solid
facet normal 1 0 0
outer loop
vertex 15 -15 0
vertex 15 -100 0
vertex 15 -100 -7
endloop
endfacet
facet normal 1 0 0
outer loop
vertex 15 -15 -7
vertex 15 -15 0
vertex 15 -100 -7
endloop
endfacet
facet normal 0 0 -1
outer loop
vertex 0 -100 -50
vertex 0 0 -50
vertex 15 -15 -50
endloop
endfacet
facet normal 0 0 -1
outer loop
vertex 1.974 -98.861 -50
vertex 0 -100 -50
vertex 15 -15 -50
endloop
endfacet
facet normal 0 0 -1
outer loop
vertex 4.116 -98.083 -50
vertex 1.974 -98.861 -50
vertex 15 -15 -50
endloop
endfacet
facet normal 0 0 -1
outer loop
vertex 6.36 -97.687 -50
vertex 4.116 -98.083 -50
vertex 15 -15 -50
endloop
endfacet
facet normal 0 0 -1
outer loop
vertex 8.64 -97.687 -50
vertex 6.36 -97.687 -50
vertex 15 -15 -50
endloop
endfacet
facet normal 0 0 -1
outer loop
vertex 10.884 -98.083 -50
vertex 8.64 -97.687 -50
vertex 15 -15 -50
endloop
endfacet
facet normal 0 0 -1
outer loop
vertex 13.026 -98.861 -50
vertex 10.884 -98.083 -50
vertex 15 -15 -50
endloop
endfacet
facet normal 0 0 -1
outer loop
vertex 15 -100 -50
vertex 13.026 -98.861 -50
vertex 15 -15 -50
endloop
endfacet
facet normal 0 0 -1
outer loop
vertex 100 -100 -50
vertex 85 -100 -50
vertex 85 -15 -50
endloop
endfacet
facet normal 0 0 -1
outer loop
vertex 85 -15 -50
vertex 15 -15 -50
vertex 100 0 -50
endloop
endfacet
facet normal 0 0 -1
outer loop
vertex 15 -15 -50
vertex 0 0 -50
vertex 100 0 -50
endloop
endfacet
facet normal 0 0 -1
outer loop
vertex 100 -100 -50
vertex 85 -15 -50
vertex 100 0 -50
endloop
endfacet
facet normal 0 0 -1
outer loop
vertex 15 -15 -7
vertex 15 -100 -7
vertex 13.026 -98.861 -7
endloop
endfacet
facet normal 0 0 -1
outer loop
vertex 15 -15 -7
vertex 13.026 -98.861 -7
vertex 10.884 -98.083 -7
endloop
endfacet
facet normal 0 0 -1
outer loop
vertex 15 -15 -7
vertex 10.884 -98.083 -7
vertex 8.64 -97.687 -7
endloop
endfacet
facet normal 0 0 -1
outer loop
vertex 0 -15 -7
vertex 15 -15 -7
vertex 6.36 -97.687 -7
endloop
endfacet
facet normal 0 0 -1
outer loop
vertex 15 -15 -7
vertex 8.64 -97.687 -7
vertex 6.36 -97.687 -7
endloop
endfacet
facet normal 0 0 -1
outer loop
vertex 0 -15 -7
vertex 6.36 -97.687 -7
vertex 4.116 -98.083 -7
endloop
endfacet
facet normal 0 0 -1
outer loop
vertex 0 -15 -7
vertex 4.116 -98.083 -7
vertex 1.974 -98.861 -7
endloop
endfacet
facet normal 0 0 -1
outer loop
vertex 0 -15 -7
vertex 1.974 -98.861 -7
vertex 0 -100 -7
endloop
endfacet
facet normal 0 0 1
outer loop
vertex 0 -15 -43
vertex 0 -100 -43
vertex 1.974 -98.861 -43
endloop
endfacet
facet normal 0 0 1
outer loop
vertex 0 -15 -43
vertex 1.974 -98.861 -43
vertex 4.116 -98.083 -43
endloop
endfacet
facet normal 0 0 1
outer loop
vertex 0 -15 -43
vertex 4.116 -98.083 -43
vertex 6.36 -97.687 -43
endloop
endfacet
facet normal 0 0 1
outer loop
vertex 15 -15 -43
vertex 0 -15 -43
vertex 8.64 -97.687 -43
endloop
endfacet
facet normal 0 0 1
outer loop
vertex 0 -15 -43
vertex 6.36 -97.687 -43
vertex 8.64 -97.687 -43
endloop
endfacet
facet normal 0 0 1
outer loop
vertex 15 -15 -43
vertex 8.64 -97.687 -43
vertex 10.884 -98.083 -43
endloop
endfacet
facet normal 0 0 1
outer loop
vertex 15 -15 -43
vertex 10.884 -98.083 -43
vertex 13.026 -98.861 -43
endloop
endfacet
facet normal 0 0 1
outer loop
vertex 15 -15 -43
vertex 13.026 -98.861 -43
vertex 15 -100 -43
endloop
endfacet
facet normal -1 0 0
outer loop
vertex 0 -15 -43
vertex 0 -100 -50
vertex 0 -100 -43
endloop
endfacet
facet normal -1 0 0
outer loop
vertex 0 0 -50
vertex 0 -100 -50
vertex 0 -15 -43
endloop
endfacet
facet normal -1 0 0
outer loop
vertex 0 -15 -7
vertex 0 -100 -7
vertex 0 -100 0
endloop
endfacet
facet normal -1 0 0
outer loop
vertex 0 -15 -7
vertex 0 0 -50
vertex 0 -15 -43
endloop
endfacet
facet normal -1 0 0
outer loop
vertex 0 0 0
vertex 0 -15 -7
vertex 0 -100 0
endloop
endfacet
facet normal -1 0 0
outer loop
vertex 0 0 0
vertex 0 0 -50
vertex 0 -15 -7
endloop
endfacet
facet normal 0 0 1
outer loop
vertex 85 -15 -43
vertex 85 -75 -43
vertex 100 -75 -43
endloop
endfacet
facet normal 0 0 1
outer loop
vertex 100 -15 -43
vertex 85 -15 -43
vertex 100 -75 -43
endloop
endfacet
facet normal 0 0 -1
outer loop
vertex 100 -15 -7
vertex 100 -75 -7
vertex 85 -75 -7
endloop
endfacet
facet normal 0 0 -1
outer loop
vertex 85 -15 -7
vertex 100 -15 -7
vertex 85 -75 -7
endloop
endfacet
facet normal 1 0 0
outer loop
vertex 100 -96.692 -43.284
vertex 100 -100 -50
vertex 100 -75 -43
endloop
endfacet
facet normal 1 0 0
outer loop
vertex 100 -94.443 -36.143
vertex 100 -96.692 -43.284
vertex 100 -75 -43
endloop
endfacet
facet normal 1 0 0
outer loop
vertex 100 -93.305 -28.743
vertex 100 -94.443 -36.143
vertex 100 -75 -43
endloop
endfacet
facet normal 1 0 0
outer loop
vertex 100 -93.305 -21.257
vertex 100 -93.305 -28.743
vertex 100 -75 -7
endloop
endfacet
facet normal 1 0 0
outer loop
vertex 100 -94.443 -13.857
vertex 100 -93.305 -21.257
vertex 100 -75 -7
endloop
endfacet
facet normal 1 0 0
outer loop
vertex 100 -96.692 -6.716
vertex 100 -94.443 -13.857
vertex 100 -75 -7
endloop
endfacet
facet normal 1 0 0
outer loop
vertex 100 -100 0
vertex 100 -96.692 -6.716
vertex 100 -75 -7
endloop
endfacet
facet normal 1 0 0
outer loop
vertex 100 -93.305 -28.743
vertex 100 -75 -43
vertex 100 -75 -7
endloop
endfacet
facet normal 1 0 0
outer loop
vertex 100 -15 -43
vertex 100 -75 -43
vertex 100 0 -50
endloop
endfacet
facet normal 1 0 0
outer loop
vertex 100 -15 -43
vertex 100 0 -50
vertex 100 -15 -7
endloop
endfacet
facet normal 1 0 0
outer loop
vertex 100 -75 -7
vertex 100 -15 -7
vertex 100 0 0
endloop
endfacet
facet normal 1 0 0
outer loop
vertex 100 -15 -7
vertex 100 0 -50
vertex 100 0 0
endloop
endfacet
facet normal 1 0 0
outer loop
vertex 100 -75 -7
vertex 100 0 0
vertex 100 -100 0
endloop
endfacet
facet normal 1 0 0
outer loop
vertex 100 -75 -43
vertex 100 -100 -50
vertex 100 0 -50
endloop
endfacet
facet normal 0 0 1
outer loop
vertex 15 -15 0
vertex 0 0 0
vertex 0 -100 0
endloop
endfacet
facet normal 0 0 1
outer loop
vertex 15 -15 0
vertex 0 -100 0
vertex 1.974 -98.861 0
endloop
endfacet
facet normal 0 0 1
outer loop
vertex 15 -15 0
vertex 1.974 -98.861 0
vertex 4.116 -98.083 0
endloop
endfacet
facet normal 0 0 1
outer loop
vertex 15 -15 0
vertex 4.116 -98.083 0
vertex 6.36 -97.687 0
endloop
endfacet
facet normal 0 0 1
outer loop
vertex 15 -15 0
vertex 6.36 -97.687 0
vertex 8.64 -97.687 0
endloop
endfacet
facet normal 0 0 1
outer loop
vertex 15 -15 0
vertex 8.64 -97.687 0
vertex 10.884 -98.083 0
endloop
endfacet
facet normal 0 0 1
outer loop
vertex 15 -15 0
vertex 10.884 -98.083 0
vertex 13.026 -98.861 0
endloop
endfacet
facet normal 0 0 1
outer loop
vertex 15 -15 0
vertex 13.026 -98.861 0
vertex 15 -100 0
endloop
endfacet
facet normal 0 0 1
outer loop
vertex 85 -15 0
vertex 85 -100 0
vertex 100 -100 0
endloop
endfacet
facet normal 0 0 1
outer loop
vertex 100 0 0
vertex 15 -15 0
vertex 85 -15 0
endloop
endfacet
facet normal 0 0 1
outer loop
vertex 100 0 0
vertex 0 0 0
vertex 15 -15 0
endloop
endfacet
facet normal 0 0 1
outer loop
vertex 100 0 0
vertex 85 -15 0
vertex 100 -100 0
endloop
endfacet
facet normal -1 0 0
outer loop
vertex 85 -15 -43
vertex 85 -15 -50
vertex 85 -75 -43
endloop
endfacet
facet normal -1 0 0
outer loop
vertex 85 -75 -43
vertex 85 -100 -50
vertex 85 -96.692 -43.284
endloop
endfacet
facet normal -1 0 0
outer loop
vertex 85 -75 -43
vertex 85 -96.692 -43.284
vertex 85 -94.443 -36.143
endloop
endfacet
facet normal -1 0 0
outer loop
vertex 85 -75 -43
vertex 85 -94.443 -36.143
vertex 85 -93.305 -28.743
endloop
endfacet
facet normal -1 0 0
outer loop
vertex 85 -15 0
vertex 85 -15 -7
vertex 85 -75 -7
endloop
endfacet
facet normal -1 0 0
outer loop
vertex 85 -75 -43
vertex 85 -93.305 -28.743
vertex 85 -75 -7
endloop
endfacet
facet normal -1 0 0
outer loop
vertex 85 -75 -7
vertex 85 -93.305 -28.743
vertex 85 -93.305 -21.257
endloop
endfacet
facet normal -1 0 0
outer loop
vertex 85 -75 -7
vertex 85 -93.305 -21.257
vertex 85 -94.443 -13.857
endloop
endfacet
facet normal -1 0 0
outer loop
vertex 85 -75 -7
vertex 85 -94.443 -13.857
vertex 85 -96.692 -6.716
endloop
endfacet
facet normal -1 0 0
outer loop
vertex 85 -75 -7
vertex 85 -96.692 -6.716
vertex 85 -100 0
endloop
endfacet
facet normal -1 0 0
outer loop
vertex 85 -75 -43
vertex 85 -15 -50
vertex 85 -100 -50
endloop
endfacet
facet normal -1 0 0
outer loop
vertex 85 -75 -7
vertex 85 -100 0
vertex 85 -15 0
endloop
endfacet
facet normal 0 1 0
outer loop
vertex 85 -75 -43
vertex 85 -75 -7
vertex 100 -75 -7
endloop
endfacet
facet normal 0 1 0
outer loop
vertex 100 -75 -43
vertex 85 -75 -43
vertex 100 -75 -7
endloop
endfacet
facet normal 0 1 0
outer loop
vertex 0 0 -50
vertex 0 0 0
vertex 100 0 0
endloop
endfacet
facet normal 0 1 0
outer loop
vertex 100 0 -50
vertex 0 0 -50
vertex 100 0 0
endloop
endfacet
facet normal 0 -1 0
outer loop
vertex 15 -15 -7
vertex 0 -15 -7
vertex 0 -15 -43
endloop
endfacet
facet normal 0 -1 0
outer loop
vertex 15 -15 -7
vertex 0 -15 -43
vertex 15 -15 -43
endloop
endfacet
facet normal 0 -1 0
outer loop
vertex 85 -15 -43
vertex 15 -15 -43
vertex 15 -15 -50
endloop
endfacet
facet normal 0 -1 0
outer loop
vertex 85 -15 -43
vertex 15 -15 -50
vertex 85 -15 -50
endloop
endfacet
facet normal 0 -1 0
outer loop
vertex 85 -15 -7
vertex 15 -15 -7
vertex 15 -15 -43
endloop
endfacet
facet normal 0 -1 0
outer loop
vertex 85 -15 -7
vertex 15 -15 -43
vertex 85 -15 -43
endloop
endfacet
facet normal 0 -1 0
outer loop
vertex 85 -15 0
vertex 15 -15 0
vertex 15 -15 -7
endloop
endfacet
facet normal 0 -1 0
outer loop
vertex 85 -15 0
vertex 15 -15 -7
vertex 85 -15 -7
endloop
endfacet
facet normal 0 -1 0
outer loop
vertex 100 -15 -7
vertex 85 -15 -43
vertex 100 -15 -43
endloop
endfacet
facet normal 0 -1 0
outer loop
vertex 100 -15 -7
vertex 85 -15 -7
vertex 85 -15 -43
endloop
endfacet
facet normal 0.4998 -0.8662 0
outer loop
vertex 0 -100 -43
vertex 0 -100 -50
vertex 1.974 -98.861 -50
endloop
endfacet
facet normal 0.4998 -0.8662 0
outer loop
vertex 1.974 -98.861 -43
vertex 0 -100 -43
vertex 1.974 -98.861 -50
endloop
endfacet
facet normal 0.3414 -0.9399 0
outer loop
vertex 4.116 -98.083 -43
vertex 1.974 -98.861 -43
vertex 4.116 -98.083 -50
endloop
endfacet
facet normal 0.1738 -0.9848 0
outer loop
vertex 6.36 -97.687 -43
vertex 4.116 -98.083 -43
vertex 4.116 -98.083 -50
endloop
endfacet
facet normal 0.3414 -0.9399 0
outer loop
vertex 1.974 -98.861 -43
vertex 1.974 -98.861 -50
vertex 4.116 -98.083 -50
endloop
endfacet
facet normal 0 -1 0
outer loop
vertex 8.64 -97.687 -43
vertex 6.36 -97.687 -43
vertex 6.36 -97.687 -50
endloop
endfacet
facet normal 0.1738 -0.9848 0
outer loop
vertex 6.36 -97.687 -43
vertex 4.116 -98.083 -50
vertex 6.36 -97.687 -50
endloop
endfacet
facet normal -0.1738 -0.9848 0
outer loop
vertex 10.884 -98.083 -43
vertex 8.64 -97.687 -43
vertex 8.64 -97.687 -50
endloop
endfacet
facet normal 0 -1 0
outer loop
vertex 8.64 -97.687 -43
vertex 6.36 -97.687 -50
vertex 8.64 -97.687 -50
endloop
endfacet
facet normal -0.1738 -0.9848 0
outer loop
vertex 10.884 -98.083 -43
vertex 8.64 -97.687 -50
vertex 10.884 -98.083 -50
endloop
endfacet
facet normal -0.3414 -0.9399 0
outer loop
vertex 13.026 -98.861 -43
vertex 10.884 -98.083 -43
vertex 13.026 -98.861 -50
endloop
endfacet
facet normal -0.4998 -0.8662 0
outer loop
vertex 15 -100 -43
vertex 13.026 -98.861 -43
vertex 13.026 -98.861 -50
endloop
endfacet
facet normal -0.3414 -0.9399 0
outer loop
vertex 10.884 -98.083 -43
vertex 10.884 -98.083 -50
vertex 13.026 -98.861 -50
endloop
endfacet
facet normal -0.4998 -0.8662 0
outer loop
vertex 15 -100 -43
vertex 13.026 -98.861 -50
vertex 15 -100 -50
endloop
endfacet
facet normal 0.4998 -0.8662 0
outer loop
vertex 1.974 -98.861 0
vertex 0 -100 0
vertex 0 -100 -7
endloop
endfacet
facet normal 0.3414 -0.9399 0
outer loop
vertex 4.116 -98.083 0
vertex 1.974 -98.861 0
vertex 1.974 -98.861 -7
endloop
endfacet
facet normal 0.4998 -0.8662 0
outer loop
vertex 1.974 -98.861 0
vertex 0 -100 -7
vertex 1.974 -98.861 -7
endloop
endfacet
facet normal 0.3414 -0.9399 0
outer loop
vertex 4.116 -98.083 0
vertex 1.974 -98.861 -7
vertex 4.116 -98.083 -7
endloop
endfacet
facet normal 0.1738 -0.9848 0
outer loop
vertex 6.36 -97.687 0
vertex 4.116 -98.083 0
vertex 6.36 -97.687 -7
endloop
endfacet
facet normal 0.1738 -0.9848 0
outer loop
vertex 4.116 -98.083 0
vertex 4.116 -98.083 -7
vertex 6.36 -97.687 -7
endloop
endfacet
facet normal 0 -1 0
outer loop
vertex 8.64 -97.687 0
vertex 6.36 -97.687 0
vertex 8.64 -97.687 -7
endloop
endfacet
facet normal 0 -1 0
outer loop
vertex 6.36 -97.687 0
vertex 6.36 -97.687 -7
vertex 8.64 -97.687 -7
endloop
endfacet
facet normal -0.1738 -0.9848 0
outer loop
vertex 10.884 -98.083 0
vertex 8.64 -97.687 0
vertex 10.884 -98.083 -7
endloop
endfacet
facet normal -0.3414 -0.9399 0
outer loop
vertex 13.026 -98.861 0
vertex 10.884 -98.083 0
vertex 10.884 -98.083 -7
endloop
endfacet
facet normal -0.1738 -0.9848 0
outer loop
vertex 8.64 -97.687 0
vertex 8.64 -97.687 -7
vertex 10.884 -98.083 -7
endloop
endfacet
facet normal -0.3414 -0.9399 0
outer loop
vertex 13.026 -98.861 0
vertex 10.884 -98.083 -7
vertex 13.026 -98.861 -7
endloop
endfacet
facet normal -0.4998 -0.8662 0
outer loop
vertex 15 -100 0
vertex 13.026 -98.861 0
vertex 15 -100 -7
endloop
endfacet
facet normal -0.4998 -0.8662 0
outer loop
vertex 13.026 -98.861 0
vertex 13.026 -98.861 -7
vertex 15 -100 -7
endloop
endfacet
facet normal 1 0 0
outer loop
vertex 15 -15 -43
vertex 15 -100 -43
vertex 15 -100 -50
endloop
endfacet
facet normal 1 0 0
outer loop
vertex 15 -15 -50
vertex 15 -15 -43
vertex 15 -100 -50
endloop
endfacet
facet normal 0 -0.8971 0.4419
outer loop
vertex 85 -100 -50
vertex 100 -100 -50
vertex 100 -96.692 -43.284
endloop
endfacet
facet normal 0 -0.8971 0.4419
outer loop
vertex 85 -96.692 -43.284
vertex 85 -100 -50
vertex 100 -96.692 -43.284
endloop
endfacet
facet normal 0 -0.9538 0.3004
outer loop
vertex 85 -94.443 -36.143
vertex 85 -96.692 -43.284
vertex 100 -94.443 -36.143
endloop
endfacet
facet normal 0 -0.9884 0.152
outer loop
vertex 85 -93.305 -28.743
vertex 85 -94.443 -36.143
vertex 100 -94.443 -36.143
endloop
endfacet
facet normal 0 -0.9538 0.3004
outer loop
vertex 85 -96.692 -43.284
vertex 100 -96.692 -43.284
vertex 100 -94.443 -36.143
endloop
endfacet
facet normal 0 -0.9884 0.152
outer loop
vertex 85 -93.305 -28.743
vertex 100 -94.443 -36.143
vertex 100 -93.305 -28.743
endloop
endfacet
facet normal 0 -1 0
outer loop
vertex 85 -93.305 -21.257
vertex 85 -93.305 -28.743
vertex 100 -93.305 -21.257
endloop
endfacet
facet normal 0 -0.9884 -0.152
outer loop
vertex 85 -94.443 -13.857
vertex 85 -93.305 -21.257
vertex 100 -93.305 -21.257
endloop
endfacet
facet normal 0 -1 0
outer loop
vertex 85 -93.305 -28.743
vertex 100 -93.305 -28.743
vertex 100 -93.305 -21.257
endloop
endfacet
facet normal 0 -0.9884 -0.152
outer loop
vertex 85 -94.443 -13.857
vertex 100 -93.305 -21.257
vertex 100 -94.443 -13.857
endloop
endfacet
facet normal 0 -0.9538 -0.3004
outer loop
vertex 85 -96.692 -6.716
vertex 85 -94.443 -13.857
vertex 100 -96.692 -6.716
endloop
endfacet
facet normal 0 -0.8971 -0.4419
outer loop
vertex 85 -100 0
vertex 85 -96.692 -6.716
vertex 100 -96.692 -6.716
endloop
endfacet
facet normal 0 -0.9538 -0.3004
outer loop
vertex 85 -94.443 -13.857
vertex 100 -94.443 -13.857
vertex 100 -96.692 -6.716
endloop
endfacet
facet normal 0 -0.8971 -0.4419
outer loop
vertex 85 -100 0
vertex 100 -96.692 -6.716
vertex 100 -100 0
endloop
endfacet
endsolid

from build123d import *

# Parameters (mm, degrees)
F0_W     = 100
F0_H     = 50
F1_DEPTH = 100
F3_DEPTH = 85
F4_W     = 15
F4_H     = 50
F5_DEPTH = 25
F7_DEPTH = 15
F9_DEPTH = 50


with BuildPart() as f1:
    # F0 (on Front) → F1 (new body)
    with BuildSketch(Plane.XZ):
        with Locations((50, -25)):
            Rectangle(F0_W, F0_H)
    extrude(amount=F1_DEPTH)

    # F2 (on face) → F3 (cut)
    with BuildSketch(Plane.XZ.offset(100)):
        Polygon((85, 0), (15, 0), (15, -7), (0, -7), (0, -43), (15, -43), (15, -50), (85, -50), (85, -43), (100, -43), (100, -7), (85, -7), align=None)
    extrude(amount=-F3_DEPTH, mode=Mode.SUBTRACT)

    # F4 (on face) → F5 (join)
    with BuildSketch(Plane.XZ.offset(100)):
        with Locations((92.5, -25)):
            Rectangle(F4_W, F4_H)
    extrude(amount=-F5_DEPTH)

    # F6 (on face) → F7 (cut)
    with BuildSketch(Plane.YZ.offset(100)):
        with BuildLine():
            Line((-100, 0), (-100, -50))
            ThreePointArc((-100, -50), (-93.161987, -25), (-100, 0))
        make_face()
    extrude(amount=-F7_DEPTH, mode=Mode.SUBTRACT)

    # F8 (on face) → F9 (cut)
    with BuildSketch(Plane(origin=(0, 0, -50), x_dir=(1, 0, 0), z_dir=(0, 0, -1))):
        with BuildLine():
            Line((15, 100), (0, 100))
            ThreePointArc((0, 100), (7.5, 97.637464), (15, 100))
        make_face()
    extrude(amount=-F9_DEPTH, mode=Mode.SUBTRACT)


solid = f1.part
